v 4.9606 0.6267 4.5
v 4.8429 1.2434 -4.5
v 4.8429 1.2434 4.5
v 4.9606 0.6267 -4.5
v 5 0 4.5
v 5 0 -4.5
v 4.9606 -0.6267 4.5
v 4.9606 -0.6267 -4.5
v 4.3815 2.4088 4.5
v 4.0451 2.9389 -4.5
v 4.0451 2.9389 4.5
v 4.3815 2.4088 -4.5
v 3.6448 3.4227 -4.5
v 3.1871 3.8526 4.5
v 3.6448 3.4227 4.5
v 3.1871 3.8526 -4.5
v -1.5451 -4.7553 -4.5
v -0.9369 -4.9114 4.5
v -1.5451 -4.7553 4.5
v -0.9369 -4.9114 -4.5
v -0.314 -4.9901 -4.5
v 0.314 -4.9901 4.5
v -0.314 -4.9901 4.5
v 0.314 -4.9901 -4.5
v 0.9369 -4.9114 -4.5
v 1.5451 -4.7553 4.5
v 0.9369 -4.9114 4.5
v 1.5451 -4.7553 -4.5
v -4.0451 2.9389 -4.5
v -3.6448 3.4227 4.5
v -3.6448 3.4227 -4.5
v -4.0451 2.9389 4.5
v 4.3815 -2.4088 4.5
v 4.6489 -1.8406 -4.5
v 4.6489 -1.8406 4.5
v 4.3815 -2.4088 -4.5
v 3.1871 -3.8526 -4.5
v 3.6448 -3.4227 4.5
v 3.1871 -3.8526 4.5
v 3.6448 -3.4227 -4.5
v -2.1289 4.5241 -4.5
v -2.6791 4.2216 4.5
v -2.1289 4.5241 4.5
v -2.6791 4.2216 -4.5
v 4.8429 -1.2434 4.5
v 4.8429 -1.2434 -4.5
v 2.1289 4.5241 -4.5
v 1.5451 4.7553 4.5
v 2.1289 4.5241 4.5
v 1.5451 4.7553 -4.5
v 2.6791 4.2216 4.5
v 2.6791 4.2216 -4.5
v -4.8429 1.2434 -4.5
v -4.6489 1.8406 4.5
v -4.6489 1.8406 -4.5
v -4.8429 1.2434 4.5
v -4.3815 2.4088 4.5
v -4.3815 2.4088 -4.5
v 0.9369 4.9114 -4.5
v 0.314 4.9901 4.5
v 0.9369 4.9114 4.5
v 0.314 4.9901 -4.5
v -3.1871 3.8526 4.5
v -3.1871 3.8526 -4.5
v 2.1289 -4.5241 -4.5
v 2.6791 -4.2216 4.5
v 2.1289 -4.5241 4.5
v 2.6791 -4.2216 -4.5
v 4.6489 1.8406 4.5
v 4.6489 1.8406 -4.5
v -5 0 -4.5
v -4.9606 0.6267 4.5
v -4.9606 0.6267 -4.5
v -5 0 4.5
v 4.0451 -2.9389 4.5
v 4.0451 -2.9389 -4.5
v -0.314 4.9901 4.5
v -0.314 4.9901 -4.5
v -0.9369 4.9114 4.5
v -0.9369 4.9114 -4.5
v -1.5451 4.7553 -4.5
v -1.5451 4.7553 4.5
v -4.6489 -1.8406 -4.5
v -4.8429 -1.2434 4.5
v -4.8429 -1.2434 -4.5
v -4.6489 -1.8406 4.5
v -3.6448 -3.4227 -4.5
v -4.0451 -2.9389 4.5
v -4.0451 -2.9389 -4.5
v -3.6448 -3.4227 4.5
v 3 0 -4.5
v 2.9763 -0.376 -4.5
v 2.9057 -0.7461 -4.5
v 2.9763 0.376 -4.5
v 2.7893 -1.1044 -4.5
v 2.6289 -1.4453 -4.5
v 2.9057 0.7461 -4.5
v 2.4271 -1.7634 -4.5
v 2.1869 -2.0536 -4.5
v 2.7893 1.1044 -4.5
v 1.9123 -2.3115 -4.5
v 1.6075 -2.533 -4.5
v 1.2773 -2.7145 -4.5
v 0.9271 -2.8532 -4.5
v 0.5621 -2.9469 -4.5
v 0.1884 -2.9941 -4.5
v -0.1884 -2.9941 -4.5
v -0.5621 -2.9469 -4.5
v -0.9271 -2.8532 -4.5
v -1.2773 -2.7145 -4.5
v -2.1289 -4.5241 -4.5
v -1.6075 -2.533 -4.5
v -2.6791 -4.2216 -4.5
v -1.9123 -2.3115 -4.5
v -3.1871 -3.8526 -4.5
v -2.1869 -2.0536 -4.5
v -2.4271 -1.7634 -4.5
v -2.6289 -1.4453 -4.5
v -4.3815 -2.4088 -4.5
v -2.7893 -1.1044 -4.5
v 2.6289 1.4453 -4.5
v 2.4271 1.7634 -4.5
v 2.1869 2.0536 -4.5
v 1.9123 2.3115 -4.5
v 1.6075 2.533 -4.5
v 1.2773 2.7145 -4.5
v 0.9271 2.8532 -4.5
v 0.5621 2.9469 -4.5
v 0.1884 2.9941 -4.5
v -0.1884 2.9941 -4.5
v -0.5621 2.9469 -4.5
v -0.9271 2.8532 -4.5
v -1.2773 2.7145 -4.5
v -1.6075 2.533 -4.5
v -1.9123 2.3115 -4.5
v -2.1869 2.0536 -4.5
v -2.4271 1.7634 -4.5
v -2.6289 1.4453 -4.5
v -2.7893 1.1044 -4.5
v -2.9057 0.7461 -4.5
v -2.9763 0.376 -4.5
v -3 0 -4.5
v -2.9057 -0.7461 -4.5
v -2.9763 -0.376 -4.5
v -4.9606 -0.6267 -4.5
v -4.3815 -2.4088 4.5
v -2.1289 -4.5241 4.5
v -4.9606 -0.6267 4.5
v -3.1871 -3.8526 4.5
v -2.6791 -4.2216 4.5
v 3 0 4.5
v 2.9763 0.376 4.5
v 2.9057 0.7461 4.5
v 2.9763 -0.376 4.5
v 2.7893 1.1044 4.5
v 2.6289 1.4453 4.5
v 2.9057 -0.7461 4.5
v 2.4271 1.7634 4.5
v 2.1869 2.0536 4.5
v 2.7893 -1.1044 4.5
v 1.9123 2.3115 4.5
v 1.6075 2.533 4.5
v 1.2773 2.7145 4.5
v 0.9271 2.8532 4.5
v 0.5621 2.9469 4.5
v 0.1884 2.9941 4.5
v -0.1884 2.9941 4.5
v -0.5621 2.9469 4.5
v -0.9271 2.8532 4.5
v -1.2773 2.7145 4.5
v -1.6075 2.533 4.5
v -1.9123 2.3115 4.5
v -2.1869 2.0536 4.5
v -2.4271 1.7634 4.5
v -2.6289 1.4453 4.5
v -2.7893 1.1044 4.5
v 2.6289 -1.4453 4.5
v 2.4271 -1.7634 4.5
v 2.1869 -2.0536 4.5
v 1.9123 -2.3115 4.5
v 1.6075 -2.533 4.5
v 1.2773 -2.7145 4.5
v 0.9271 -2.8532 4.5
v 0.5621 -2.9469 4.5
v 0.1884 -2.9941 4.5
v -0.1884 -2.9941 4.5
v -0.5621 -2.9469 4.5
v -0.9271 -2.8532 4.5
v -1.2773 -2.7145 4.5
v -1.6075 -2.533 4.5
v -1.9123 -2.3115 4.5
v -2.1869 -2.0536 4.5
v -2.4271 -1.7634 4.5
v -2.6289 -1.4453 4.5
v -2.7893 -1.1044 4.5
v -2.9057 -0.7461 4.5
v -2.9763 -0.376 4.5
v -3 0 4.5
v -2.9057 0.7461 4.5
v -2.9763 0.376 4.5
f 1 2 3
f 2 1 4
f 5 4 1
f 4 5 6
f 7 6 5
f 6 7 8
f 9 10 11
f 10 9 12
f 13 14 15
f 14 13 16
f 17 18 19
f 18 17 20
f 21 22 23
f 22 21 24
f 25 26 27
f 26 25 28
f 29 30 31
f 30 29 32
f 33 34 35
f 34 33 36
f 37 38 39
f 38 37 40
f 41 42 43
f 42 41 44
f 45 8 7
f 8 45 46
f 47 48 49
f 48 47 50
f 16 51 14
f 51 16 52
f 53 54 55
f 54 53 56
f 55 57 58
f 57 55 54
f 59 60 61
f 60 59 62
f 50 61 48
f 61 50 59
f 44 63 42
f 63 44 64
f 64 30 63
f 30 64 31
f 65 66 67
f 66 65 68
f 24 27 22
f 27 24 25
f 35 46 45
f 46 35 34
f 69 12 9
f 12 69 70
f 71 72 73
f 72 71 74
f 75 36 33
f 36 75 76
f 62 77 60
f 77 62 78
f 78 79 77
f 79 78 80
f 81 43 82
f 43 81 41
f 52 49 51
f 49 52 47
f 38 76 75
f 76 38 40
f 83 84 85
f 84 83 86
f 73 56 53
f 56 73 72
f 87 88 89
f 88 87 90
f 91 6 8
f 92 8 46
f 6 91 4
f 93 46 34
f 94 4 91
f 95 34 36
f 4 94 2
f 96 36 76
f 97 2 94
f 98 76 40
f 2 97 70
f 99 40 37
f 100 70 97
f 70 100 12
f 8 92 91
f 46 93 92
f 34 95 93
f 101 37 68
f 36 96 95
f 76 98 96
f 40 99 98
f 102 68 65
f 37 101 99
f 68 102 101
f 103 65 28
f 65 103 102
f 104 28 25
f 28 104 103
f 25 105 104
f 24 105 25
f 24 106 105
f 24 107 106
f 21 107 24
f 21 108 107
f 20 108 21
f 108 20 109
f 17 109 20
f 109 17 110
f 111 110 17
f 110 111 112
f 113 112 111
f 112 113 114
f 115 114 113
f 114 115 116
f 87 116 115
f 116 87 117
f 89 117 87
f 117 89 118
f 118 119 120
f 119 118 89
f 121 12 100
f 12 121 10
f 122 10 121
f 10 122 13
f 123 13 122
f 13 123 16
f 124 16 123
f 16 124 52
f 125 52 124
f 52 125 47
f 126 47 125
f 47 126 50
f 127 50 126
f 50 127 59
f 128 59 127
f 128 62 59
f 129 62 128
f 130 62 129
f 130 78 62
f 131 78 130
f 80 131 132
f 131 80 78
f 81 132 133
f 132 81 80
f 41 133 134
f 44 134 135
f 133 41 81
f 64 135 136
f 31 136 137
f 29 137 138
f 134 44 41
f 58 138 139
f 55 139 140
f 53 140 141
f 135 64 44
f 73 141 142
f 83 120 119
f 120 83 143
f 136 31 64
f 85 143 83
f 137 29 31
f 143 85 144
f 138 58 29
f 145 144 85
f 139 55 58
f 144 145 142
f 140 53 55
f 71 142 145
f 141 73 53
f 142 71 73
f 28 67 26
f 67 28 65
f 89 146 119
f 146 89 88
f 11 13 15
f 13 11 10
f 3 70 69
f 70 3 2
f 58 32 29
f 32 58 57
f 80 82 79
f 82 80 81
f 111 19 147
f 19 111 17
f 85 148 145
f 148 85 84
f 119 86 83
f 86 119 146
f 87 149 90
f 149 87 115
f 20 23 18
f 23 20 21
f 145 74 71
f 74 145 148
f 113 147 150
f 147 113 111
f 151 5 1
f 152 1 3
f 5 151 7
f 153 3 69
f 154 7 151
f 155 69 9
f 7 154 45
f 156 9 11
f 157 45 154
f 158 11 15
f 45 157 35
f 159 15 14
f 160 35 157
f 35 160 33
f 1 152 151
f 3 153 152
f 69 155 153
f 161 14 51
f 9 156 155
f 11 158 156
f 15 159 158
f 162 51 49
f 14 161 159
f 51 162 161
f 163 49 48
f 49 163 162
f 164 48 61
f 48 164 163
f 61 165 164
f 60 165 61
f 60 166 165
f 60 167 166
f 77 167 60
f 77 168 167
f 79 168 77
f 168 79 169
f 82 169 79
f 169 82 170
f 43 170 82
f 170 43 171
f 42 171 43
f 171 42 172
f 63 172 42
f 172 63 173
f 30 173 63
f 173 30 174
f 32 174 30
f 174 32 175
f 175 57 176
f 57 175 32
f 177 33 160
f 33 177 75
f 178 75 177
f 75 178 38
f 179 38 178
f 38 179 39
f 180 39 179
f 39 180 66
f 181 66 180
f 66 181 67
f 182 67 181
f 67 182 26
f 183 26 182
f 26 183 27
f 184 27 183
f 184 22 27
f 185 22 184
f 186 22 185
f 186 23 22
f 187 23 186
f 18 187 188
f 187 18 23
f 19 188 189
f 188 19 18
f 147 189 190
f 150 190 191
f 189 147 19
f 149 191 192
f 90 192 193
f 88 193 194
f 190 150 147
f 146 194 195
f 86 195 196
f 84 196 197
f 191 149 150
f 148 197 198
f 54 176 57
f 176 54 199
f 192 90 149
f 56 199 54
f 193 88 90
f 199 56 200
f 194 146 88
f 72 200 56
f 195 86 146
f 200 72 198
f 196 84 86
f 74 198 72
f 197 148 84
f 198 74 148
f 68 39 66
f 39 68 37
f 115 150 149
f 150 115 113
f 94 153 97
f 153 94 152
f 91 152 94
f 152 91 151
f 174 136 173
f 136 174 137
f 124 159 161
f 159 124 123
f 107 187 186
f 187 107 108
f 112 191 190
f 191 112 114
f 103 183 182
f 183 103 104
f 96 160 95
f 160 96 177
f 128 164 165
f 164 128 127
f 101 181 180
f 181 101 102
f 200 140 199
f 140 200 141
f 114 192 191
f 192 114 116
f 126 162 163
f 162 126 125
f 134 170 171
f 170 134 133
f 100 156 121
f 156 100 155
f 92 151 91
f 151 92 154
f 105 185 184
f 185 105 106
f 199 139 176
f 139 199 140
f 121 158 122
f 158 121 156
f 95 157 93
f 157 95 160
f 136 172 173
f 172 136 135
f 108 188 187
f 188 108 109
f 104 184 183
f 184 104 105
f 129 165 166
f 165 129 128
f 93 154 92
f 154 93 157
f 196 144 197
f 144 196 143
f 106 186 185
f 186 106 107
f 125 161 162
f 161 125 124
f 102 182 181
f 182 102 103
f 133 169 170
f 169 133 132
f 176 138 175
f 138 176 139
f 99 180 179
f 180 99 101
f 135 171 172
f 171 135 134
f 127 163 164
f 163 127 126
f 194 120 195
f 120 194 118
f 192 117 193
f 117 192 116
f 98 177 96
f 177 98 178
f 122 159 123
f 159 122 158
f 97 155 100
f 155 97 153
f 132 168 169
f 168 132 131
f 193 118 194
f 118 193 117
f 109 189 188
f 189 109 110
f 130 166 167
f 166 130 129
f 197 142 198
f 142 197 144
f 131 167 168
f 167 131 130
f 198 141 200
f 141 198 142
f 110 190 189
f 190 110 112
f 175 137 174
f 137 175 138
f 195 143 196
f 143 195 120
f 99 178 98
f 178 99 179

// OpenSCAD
$fn = 50;


difference() {
	union() {
		translate(v = [0, 0, -4.5000000000]) {
			cylinder(h = 9, r = 5.0000000000);
		}
	}
	union() {
		translate(v = [0, 0, -100.0000000000]) {
			cylinder(h = 200, r = 3.0000000000);
		}
	}
}
